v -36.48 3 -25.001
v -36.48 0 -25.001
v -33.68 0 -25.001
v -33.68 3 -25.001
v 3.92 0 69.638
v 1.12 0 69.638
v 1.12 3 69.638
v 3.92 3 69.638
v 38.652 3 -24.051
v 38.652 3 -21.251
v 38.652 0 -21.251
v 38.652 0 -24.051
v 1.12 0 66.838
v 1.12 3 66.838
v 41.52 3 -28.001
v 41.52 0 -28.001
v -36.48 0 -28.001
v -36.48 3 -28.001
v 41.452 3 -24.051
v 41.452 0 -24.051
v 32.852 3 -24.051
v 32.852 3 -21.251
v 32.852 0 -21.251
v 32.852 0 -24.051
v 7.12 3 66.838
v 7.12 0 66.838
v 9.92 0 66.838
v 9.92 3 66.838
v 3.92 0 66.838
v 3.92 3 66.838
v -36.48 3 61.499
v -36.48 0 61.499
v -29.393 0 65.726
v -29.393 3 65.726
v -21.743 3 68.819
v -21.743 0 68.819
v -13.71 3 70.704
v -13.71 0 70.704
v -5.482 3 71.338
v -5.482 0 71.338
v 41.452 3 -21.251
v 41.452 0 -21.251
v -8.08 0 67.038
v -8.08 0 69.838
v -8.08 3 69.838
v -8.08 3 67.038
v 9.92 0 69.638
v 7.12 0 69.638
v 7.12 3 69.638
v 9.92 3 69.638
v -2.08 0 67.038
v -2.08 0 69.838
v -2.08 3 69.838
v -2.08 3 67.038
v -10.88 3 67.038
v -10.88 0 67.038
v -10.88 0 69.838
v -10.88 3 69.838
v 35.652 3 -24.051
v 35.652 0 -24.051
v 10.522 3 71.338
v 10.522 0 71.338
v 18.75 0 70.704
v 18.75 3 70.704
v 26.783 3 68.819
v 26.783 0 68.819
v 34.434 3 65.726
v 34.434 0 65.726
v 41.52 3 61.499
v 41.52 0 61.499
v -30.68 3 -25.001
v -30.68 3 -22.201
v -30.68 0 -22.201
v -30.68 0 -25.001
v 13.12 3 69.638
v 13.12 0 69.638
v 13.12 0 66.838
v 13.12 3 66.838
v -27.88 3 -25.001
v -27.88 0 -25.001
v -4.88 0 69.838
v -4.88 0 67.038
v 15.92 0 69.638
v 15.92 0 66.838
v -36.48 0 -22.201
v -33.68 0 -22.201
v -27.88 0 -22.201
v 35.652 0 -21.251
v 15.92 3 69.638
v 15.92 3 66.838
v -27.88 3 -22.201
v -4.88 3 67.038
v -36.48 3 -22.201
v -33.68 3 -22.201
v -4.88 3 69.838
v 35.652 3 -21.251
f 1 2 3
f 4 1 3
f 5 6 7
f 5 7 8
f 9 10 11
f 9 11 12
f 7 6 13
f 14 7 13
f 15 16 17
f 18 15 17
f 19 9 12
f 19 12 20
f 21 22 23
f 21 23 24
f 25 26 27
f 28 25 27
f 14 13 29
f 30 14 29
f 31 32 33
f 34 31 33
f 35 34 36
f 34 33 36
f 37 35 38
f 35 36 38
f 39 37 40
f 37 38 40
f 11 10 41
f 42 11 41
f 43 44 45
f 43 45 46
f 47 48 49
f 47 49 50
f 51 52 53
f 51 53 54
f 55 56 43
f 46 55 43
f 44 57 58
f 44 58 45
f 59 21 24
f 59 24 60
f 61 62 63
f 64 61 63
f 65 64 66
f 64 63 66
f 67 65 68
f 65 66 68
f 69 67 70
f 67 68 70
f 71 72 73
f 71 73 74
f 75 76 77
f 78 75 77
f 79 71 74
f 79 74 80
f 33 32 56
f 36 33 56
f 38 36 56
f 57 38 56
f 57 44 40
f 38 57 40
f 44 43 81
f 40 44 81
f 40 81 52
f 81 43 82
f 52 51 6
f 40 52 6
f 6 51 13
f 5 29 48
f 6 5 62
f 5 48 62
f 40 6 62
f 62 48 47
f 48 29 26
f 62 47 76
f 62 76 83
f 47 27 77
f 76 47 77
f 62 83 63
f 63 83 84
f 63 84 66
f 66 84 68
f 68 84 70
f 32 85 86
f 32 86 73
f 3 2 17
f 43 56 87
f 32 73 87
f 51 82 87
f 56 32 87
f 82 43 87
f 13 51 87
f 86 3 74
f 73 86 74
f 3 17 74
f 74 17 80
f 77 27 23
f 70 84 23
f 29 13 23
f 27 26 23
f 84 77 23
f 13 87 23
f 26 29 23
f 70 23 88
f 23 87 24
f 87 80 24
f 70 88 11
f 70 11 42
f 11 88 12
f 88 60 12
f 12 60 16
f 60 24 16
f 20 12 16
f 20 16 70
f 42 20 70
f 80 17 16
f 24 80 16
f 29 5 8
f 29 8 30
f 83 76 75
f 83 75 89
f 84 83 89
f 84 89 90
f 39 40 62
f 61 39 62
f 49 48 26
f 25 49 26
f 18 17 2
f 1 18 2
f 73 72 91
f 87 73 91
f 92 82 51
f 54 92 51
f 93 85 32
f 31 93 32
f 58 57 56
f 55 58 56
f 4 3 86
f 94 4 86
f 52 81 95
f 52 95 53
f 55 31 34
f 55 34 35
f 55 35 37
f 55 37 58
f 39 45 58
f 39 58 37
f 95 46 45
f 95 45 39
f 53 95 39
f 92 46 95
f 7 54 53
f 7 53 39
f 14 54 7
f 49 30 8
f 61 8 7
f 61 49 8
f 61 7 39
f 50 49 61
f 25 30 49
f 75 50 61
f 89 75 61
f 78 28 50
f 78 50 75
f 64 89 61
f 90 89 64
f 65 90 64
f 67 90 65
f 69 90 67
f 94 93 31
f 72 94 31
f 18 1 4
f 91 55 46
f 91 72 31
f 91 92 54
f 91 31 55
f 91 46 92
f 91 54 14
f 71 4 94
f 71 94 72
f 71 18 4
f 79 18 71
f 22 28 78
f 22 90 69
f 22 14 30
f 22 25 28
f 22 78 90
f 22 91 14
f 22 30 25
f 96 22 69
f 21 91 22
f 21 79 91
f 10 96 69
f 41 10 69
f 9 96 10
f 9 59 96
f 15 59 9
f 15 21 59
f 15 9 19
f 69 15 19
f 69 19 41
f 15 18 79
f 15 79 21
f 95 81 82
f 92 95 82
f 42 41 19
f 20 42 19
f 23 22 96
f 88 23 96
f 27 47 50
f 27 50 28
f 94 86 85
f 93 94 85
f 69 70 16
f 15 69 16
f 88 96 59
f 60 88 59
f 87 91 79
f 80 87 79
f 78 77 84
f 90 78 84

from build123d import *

# Parameters (mm, degrees)
SKETCH1_W           = 2.8
SKETCH1_H           = 2.8
BOSS_EXTRUDE1_DEPTH = 3


with BuildPart() as part:
    # Sketch1 → Boss-Extrude1 (new body)
    with BuildSketch(Plane(origin=(0, 0, 0), x_dir=(1, 0, 0), z_dir=(0, 1, 0))):
        with BuildLine():
            Line((-36.479854722, 28.001428065), (-36.479854722, 25.001428065))
            Line((-36.479854722, 25.001428065), (-33.679854722, 25.001428065))
            Line((-33.679854722, 25.001428065), (-33.679854722, 22.201428065))
            Line((-33.679854722, 22.201428065), (-36.479854722, 22.201428065))
            Line((-36.479854722, 22.201428065), (-36.479854722, -61.498571935))
            ThreePointArc((-36.479854722, -61.498571935), (-21.743078282, -68.818947396), (-5.482204259, -71.337767111))
            Line((-5.482204259, -71.337767111), (10.522494814, -71.337767111))
            ThreePointArc((10.522494814, -71.337767111), (26.783368837, -68.818947396), (41.520145278, -61.498571935))
            Line((41.520145278, -61.498571935), (41.520145278, 28.001428065))
            Line((41.520145278, 28.001428065), (-36.479854722, 28.001428065))
        make_face()
        with Locations((-29.279854722, 23.601428065)):
            Rectangle(SKETCH1_W, SKETCH1_H, mode=Mode.SUBTRACT)
        with Locations((-9.479854722, -68.437767111)):
            Rectangle(SKETCH1_W, SKETCH1_H, mode=Mode.SUBTRACT)
        with Locations((-3.479854722, -68.437767111)):
            Rectangle(SKETCH1_W, SKETCH1_H, mode=Mode.SUBTRACT)
        with Locations((2.520145278, -68.237767111)):
            Rectangle(SKETCH1_W, SKETCH1_H, mode=Mode.SUBTRACT)
        with Locations((8.520145278, -68.237767111)):
            Rectangle(SKETCH1_W, SKETCH1_H, mode=Mode.SUBTRACT)
        with Locations((14.520145278, -68.237767111)):
            Rectangle(SKETCH1_W, SKETCH1_H, mode=Mode.SUBTRACT)
        with Locations((34.252496444, 22.650704456)):
            Rectangle(SKETCH1_W, SKETCH1_H, mode=Mode.SUBTRACT)
        with Locations((40.052496444, 22.650704456)):
            Rectangle(SKETCH1_W, SKETCH1_H, mode=Mode.SUBTRACT)
    extrude(amount=BOSS_EXTRUDE1_DEPTH)


solid = part.part
